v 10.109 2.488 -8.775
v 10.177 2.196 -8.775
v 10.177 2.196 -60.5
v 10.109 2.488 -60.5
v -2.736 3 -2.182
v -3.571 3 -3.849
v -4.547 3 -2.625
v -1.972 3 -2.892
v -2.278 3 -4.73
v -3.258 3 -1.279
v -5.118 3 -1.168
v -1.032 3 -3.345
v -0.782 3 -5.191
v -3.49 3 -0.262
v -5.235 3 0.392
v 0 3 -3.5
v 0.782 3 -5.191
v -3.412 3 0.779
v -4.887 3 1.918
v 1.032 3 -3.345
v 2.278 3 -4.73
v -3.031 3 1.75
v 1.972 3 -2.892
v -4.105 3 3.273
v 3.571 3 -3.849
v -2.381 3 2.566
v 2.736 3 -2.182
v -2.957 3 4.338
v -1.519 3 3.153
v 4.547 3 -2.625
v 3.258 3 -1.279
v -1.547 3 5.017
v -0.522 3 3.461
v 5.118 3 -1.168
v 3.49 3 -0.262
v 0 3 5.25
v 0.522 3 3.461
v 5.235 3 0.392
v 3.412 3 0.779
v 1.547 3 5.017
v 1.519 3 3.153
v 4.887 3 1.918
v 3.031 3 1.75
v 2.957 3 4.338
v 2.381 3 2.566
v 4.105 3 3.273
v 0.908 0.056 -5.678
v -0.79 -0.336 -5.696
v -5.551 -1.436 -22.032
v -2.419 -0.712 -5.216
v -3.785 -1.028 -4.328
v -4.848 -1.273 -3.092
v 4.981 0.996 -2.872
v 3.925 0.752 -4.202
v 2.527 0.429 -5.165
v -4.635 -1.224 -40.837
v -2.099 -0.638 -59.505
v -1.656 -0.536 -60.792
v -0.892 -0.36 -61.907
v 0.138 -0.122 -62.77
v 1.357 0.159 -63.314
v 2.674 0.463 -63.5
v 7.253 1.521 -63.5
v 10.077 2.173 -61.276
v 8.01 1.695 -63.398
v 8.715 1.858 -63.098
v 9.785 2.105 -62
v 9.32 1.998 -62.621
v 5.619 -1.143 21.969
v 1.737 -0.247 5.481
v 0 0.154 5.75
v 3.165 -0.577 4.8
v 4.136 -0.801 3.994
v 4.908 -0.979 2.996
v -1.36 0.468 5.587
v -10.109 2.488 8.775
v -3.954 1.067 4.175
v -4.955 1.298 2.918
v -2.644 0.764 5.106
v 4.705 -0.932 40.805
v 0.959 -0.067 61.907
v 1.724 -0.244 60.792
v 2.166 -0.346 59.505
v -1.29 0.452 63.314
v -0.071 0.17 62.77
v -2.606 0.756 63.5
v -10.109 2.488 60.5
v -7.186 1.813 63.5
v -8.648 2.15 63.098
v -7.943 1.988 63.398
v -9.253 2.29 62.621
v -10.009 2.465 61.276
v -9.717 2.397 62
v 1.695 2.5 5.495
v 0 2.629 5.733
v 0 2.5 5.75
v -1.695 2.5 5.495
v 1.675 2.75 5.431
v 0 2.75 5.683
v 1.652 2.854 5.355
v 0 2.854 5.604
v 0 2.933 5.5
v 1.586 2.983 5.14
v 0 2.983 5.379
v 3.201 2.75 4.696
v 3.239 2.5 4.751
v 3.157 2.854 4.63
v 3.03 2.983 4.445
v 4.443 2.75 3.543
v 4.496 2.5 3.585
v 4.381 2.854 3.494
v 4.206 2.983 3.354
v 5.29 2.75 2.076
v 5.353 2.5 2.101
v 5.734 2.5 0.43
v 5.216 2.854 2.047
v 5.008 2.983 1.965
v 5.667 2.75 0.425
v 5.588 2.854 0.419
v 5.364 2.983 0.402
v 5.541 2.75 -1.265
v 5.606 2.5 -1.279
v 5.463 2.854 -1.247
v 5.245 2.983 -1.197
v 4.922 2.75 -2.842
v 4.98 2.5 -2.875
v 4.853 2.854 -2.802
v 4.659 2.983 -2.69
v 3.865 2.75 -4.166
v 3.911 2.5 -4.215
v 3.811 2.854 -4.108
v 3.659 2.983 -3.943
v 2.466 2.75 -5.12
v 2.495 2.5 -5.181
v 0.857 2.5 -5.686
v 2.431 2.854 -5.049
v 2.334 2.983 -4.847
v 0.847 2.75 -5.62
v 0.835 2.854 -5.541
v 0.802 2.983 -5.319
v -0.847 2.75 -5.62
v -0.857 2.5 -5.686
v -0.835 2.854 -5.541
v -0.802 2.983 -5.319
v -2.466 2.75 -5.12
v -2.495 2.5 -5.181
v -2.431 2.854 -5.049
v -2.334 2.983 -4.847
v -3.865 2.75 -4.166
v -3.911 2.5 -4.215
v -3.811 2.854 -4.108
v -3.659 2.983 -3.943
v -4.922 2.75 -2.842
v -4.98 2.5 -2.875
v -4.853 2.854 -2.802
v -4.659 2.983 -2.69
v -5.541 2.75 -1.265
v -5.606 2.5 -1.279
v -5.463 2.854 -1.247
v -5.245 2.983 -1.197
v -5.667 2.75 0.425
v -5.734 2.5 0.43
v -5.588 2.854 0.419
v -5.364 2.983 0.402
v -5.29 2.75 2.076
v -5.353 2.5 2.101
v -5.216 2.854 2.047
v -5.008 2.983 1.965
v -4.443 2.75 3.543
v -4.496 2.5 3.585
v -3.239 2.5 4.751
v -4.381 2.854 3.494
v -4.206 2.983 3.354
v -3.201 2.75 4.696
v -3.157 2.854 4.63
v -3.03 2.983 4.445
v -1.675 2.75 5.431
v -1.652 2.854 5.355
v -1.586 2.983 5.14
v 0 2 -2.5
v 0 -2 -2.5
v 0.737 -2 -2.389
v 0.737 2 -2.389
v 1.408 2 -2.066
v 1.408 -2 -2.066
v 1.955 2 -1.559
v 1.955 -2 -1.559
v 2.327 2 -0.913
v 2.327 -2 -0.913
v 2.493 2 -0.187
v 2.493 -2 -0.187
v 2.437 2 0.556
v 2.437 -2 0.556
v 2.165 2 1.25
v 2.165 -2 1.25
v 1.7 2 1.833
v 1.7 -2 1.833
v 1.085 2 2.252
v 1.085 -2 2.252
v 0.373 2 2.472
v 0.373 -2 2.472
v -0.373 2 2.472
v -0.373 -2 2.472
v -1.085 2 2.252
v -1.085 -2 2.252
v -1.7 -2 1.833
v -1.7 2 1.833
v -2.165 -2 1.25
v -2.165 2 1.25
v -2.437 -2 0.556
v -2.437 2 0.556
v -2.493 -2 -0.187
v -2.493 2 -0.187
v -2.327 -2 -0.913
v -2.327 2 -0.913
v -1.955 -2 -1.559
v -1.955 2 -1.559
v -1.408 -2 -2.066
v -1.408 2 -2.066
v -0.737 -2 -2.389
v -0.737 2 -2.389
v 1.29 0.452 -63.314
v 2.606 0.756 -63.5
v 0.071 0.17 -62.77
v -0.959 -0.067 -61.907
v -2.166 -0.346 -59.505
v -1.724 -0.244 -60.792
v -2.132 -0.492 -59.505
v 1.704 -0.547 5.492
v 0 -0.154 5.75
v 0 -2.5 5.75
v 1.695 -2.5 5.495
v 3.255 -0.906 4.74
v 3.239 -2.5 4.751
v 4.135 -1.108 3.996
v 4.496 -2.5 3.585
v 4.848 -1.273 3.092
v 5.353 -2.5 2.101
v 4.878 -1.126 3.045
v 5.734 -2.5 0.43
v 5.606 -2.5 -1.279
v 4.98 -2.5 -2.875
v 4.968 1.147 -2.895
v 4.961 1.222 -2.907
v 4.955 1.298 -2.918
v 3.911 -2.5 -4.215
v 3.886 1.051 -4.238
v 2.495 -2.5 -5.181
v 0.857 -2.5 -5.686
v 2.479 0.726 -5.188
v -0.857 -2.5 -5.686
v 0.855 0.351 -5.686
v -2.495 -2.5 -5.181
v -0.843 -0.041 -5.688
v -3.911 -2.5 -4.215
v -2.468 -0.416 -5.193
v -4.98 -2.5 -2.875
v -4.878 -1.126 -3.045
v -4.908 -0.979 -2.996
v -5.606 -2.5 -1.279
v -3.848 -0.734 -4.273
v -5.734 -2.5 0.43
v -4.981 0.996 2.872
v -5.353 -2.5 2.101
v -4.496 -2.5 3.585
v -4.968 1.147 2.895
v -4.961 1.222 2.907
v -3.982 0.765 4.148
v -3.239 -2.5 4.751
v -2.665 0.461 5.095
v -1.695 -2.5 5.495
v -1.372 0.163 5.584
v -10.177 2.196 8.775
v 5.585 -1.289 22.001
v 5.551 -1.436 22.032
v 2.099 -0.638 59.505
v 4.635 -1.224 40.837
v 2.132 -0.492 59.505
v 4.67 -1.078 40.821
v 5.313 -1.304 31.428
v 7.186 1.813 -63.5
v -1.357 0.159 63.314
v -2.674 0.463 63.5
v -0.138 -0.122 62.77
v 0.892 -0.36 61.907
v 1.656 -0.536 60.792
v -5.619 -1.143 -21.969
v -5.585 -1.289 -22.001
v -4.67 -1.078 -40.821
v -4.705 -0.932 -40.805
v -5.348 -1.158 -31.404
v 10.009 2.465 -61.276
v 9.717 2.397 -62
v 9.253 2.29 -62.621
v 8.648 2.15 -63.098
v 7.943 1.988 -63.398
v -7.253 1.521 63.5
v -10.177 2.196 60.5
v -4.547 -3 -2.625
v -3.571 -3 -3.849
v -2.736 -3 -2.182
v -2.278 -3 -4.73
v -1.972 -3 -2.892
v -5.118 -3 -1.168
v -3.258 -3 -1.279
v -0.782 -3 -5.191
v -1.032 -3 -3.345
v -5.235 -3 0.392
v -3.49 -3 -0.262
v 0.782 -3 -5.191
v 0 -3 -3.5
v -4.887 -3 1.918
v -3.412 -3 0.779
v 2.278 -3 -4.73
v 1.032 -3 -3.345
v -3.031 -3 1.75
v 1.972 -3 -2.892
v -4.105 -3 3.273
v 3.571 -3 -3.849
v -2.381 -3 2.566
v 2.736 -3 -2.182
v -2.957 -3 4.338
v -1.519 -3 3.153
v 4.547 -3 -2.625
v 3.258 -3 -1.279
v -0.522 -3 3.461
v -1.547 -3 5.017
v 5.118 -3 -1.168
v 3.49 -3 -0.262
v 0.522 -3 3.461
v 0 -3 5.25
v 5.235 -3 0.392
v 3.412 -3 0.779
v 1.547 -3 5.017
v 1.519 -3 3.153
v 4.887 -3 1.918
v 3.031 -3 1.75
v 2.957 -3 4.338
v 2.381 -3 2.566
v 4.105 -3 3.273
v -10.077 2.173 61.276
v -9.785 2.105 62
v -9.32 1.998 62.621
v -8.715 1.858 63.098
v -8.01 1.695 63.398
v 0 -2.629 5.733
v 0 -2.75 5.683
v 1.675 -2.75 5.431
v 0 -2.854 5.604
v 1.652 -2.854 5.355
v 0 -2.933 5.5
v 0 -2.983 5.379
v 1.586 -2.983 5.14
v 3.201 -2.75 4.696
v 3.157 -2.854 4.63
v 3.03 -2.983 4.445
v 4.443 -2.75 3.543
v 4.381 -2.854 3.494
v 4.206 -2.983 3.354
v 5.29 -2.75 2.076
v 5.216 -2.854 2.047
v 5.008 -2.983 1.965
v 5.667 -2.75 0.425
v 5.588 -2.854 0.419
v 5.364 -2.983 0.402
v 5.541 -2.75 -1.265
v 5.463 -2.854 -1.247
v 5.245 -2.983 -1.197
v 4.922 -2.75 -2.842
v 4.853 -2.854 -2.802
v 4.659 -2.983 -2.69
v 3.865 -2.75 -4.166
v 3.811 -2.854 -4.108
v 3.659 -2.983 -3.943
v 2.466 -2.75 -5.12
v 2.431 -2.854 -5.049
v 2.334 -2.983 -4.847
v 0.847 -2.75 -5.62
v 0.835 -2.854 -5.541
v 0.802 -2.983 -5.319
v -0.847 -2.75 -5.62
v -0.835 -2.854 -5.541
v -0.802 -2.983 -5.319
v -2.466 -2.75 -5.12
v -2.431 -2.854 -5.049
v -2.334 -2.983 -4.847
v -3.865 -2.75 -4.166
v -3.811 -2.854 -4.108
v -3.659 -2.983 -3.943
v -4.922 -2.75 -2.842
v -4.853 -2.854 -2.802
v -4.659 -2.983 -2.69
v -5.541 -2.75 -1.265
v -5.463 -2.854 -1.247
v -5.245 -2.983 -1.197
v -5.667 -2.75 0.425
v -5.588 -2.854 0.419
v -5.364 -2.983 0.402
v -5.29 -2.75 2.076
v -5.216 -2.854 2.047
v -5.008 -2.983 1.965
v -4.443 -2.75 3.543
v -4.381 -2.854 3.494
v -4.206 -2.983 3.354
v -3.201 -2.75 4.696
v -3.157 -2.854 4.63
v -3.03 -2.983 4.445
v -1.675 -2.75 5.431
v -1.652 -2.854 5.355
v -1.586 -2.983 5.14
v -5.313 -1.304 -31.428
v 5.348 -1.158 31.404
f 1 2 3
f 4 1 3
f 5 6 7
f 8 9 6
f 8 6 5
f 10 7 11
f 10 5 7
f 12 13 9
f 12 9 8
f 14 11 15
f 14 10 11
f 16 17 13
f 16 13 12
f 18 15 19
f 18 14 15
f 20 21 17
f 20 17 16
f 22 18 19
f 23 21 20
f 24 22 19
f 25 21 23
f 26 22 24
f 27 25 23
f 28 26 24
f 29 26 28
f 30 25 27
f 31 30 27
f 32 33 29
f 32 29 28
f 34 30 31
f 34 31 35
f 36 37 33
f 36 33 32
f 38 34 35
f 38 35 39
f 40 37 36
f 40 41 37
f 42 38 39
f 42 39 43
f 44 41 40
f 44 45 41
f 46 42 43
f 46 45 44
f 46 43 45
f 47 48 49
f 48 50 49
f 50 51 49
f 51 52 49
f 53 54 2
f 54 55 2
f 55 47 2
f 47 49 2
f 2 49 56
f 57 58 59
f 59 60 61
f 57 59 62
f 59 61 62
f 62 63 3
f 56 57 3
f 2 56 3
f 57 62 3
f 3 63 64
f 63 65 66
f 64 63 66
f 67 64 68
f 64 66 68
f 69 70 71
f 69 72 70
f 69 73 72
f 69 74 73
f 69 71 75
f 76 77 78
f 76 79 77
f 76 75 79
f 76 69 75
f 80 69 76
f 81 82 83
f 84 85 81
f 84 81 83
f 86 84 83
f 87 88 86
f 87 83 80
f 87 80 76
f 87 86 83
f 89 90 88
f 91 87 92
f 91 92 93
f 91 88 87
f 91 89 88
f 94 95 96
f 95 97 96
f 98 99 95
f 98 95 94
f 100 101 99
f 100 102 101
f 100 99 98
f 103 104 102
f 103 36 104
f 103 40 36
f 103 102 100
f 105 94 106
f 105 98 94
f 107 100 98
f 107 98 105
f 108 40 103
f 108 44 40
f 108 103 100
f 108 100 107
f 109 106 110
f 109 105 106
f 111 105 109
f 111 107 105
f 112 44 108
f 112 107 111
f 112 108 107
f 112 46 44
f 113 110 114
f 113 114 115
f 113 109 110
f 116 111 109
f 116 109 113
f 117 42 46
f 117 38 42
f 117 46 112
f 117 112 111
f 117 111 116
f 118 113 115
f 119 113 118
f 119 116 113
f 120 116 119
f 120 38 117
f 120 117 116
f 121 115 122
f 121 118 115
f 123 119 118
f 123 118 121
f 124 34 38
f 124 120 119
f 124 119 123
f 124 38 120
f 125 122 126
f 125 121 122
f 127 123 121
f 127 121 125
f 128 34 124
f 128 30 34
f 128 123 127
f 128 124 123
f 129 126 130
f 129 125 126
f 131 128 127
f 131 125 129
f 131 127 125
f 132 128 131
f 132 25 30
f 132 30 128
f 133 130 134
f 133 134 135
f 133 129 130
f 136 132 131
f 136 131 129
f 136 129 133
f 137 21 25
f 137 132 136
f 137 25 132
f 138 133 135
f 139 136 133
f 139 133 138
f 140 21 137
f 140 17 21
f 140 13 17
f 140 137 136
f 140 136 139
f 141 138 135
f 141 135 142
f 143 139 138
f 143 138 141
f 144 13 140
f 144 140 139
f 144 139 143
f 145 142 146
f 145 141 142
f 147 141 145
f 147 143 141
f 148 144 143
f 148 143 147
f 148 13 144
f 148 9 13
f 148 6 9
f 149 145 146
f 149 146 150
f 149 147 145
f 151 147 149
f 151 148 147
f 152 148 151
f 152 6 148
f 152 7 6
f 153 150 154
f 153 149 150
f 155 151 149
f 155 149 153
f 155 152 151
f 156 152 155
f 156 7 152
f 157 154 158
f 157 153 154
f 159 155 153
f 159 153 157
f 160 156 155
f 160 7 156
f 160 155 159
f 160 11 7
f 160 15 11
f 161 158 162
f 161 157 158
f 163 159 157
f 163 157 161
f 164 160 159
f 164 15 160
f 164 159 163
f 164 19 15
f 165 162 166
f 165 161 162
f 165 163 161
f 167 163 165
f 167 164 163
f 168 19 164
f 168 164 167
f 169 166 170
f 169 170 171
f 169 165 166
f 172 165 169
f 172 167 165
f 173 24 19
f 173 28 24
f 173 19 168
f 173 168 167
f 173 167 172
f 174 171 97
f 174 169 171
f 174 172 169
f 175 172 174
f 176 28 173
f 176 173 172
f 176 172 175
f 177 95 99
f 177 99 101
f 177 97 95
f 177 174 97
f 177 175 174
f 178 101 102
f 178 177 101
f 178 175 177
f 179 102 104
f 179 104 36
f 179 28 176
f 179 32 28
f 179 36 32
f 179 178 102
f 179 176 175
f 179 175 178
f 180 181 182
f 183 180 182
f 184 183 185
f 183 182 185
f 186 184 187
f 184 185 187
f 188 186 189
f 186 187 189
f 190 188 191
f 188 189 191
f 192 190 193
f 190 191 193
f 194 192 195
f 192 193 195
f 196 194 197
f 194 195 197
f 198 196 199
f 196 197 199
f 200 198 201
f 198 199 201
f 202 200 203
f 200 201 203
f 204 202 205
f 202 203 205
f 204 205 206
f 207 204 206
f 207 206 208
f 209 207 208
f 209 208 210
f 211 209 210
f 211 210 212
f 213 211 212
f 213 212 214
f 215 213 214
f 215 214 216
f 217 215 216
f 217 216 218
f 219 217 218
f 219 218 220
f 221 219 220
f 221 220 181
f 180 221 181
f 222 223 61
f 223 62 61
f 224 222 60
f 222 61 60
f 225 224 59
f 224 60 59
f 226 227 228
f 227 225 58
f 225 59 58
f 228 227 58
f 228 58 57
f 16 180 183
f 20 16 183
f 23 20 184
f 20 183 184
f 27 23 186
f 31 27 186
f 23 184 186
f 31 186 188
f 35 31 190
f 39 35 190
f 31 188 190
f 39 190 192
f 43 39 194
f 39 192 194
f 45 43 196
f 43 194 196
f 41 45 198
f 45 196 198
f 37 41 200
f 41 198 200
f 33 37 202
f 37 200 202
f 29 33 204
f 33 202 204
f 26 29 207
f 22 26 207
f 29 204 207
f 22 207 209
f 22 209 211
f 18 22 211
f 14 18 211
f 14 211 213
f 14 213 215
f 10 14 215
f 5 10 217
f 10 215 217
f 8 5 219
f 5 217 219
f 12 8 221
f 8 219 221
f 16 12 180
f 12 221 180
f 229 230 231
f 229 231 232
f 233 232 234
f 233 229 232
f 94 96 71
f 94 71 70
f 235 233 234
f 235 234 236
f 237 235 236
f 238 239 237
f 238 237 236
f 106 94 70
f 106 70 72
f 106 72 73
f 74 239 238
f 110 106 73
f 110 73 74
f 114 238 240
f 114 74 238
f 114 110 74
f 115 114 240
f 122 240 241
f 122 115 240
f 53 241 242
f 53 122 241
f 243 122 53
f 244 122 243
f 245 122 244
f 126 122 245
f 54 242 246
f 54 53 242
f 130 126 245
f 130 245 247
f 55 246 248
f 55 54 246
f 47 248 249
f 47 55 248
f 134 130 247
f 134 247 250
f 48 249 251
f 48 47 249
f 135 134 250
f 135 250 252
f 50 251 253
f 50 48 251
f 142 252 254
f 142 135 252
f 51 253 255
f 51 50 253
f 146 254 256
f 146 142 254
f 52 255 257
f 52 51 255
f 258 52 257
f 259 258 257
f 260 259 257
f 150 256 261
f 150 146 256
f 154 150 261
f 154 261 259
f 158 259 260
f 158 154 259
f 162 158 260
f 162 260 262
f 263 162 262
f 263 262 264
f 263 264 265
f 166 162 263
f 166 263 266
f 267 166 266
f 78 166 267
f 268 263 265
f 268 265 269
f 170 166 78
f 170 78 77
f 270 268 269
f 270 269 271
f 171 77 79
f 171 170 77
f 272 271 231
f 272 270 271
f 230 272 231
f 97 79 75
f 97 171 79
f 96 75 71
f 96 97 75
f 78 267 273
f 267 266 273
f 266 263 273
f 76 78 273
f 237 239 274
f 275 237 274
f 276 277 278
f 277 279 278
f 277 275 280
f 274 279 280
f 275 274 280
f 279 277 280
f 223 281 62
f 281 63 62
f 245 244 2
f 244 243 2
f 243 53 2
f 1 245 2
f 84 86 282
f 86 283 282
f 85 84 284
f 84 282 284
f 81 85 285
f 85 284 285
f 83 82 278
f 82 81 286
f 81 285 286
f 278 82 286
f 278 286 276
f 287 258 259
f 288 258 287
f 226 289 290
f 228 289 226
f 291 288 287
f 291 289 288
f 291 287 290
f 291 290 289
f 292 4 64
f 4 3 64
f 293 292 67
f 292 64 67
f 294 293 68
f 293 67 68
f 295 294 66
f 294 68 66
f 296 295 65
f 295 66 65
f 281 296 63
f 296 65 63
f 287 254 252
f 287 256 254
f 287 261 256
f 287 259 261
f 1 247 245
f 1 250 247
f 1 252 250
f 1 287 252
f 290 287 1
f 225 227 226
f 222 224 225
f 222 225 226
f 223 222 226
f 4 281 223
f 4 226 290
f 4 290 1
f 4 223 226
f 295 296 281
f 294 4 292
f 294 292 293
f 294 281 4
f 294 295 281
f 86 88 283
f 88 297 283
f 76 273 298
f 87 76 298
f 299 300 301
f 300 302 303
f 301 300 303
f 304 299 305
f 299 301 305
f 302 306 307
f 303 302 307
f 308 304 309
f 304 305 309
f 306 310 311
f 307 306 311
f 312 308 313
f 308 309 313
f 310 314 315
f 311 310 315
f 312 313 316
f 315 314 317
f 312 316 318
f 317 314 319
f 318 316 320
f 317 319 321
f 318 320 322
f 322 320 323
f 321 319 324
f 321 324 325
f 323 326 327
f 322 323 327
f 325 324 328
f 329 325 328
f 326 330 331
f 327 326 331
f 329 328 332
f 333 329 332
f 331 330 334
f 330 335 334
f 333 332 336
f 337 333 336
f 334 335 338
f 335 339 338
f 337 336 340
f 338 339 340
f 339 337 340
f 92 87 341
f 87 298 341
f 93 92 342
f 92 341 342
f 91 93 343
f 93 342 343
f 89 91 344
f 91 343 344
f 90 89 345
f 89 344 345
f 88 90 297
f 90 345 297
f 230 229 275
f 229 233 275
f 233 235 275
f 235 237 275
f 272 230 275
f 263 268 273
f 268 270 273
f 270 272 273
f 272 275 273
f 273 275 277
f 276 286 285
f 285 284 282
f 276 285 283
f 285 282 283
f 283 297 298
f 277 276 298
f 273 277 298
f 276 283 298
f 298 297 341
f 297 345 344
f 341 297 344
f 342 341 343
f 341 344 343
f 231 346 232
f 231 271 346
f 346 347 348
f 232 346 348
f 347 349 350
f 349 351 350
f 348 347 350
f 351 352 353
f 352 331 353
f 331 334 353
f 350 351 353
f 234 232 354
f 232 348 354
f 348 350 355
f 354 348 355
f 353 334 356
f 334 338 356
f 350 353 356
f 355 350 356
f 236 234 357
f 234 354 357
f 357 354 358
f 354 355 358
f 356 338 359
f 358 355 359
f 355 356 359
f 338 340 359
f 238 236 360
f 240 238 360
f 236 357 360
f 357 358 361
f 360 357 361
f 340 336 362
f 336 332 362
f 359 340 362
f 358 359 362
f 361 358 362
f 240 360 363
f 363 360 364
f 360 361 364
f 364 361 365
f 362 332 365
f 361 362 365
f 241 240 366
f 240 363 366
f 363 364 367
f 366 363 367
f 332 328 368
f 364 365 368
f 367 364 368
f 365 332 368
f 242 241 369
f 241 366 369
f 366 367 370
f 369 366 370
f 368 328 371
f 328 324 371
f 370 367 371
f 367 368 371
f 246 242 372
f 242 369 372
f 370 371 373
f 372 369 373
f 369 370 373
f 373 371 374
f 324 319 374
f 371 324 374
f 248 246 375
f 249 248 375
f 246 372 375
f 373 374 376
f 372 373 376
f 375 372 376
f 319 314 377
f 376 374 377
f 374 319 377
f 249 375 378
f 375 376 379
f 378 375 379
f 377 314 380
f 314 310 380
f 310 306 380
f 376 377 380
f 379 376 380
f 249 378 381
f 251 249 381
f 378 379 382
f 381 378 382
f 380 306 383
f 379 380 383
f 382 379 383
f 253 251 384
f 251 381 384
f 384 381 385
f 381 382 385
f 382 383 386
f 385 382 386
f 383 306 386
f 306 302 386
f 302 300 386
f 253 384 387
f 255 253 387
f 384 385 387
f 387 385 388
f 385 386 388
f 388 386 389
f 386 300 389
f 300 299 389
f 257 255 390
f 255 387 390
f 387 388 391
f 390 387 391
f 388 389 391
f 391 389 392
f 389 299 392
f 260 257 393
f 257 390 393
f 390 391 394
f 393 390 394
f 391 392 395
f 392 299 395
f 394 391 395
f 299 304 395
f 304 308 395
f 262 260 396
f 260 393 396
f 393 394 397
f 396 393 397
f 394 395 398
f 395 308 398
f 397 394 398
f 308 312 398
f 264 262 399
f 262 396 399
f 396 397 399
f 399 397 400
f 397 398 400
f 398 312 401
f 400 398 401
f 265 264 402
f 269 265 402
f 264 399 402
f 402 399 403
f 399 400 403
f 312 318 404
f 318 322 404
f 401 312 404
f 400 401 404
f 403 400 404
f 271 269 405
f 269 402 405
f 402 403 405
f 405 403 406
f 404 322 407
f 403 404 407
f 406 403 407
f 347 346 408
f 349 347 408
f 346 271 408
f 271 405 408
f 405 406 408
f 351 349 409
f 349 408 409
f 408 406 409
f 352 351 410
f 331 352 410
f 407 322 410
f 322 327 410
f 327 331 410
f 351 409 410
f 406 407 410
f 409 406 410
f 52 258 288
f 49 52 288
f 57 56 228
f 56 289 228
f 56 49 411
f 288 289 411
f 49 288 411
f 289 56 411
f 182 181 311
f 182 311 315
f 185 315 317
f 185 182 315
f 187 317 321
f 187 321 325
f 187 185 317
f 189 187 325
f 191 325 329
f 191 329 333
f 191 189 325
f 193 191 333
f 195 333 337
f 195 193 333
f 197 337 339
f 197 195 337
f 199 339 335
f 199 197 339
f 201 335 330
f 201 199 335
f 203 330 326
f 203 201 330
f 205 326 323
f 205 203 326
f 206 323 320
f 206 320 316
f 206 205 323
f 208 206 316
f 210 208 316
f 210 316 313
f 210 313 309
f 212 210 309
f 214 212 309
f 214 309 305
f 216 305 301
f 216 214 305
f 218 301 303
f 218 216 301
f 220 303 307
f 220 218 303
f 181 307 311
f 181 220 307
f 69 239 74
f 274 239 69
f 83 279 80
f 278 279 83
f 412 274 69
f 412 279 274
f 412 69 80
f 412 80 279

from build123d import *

# Parameters (mm, degrees)
SKETCH1_R            = 5.75
BOSS_EXTRUDE2_DEPTH  = 3
BOSS_EXTRUDE10_DEPTH = 0.15
CIRPATTERN1_COUNT    = 2
SKETCH5_R            = 2.5
CUT_EXTRUDE1_DEPTH   = 65.589571664
FILLET1_R            = 0.5
CHAMFER1_SIZE        = 1


with BuildPart() as part:
    # Sketch1 → Boss-Extrude2 (new, symmetric)
    with BuildSketch(Plane(origin=(0, 0, 0), x_dir=(1, 0, 0), z_dir=(0, 1, 0))):
        with Locations(Location((0, 0, 0), (0, 0, 270))):
            Circle(SKETCH1_R)
    extrude(amount=BOSS_EXTRUDE2_DEPTH, both=True)

    # Sketch4 → Boss-Extrude10 (add, symmetric)
    with BuildSketch(Plane(origin=(0, 0, 0), x_dir=(0.9743700647852351, -0.22495105434386553, 0), z_dir=(-0.22495105434386553, -0.9743700647852351, 0))):
        with BuildLine():
            Line((-10.409634183, 8.775037851), (-10.409634183, 60.5))
            ThreePointArc((-10.409634183, 60.5), (-9.530954526, 62.621320344), (-7.409634183, 63.5))
            Line((-7.409634183, 63.5), (-2.709478927, 63.5))
            ThreePointArc((-2.709478927, 63.5), (0.450679553, 62.374712683), (2.188403531, 59.505359351))
            add(Edge.make_bspline(
                [(4.983255085, 2.767158968), (7.368647348, 31.445436933), (2.188403531, 59.505359351)],
                knots=[0, 0, 0, 1, 1, 1], degree=2))
            ThreePointArc((4.983255085, 2.767158968), (0, 5.7), (-4.983255085, 2.767158968))
            Line((-4.983255085, 2.767158968), (-10.409634183, 8.775037851))
        make_face()
    boss_extrude10 = extrude(amount=BOSS_EXTRUDE10_DEPTH, both=True)

    # CirPattern1: Boss-Extrude10 ×2 about axis
    cirpattern1_axis = Axis((0, 3, 0), (0, -1, 0))
    for i in range(1, CIRPATTERN1_COUNT):
        add(boss_extrude10.rotate(cirpattern1_axis, i * 360 / CIRPATTERN1_COUNT))

    # Sketch5 → Cut-Extrude1 (cut, through all)
    with BuildSketch(Plane.XZ.offset(3)):
        with Locations(Location((0, 0, 0), (0, 0, 270))):
            Circle(SKETCH5_R)
    extrude(amount=-CUT_EXTRUDE1_DEPTH, mode=Mode.SUBTRACT)

    # Fillet1
    fillet1_edges = [part.edges().sort_by_distance(p)[0] for p in [
        (0, -3, -5.75),
        (0, 3, -5.75),
    ]]
    fillet(fillet1_edges, radius=FILLET1_R)

    # Chamfer1
    chamfer1_edges = [part.edges().sort_by_distance(p)[0] for p in [
        (0, 3, 2.5),
        (0, -3, 2.5),
    ]]
    chamfer(chamfer1_edges, length=CHAMFER1_SIZE)


solid = part.part
